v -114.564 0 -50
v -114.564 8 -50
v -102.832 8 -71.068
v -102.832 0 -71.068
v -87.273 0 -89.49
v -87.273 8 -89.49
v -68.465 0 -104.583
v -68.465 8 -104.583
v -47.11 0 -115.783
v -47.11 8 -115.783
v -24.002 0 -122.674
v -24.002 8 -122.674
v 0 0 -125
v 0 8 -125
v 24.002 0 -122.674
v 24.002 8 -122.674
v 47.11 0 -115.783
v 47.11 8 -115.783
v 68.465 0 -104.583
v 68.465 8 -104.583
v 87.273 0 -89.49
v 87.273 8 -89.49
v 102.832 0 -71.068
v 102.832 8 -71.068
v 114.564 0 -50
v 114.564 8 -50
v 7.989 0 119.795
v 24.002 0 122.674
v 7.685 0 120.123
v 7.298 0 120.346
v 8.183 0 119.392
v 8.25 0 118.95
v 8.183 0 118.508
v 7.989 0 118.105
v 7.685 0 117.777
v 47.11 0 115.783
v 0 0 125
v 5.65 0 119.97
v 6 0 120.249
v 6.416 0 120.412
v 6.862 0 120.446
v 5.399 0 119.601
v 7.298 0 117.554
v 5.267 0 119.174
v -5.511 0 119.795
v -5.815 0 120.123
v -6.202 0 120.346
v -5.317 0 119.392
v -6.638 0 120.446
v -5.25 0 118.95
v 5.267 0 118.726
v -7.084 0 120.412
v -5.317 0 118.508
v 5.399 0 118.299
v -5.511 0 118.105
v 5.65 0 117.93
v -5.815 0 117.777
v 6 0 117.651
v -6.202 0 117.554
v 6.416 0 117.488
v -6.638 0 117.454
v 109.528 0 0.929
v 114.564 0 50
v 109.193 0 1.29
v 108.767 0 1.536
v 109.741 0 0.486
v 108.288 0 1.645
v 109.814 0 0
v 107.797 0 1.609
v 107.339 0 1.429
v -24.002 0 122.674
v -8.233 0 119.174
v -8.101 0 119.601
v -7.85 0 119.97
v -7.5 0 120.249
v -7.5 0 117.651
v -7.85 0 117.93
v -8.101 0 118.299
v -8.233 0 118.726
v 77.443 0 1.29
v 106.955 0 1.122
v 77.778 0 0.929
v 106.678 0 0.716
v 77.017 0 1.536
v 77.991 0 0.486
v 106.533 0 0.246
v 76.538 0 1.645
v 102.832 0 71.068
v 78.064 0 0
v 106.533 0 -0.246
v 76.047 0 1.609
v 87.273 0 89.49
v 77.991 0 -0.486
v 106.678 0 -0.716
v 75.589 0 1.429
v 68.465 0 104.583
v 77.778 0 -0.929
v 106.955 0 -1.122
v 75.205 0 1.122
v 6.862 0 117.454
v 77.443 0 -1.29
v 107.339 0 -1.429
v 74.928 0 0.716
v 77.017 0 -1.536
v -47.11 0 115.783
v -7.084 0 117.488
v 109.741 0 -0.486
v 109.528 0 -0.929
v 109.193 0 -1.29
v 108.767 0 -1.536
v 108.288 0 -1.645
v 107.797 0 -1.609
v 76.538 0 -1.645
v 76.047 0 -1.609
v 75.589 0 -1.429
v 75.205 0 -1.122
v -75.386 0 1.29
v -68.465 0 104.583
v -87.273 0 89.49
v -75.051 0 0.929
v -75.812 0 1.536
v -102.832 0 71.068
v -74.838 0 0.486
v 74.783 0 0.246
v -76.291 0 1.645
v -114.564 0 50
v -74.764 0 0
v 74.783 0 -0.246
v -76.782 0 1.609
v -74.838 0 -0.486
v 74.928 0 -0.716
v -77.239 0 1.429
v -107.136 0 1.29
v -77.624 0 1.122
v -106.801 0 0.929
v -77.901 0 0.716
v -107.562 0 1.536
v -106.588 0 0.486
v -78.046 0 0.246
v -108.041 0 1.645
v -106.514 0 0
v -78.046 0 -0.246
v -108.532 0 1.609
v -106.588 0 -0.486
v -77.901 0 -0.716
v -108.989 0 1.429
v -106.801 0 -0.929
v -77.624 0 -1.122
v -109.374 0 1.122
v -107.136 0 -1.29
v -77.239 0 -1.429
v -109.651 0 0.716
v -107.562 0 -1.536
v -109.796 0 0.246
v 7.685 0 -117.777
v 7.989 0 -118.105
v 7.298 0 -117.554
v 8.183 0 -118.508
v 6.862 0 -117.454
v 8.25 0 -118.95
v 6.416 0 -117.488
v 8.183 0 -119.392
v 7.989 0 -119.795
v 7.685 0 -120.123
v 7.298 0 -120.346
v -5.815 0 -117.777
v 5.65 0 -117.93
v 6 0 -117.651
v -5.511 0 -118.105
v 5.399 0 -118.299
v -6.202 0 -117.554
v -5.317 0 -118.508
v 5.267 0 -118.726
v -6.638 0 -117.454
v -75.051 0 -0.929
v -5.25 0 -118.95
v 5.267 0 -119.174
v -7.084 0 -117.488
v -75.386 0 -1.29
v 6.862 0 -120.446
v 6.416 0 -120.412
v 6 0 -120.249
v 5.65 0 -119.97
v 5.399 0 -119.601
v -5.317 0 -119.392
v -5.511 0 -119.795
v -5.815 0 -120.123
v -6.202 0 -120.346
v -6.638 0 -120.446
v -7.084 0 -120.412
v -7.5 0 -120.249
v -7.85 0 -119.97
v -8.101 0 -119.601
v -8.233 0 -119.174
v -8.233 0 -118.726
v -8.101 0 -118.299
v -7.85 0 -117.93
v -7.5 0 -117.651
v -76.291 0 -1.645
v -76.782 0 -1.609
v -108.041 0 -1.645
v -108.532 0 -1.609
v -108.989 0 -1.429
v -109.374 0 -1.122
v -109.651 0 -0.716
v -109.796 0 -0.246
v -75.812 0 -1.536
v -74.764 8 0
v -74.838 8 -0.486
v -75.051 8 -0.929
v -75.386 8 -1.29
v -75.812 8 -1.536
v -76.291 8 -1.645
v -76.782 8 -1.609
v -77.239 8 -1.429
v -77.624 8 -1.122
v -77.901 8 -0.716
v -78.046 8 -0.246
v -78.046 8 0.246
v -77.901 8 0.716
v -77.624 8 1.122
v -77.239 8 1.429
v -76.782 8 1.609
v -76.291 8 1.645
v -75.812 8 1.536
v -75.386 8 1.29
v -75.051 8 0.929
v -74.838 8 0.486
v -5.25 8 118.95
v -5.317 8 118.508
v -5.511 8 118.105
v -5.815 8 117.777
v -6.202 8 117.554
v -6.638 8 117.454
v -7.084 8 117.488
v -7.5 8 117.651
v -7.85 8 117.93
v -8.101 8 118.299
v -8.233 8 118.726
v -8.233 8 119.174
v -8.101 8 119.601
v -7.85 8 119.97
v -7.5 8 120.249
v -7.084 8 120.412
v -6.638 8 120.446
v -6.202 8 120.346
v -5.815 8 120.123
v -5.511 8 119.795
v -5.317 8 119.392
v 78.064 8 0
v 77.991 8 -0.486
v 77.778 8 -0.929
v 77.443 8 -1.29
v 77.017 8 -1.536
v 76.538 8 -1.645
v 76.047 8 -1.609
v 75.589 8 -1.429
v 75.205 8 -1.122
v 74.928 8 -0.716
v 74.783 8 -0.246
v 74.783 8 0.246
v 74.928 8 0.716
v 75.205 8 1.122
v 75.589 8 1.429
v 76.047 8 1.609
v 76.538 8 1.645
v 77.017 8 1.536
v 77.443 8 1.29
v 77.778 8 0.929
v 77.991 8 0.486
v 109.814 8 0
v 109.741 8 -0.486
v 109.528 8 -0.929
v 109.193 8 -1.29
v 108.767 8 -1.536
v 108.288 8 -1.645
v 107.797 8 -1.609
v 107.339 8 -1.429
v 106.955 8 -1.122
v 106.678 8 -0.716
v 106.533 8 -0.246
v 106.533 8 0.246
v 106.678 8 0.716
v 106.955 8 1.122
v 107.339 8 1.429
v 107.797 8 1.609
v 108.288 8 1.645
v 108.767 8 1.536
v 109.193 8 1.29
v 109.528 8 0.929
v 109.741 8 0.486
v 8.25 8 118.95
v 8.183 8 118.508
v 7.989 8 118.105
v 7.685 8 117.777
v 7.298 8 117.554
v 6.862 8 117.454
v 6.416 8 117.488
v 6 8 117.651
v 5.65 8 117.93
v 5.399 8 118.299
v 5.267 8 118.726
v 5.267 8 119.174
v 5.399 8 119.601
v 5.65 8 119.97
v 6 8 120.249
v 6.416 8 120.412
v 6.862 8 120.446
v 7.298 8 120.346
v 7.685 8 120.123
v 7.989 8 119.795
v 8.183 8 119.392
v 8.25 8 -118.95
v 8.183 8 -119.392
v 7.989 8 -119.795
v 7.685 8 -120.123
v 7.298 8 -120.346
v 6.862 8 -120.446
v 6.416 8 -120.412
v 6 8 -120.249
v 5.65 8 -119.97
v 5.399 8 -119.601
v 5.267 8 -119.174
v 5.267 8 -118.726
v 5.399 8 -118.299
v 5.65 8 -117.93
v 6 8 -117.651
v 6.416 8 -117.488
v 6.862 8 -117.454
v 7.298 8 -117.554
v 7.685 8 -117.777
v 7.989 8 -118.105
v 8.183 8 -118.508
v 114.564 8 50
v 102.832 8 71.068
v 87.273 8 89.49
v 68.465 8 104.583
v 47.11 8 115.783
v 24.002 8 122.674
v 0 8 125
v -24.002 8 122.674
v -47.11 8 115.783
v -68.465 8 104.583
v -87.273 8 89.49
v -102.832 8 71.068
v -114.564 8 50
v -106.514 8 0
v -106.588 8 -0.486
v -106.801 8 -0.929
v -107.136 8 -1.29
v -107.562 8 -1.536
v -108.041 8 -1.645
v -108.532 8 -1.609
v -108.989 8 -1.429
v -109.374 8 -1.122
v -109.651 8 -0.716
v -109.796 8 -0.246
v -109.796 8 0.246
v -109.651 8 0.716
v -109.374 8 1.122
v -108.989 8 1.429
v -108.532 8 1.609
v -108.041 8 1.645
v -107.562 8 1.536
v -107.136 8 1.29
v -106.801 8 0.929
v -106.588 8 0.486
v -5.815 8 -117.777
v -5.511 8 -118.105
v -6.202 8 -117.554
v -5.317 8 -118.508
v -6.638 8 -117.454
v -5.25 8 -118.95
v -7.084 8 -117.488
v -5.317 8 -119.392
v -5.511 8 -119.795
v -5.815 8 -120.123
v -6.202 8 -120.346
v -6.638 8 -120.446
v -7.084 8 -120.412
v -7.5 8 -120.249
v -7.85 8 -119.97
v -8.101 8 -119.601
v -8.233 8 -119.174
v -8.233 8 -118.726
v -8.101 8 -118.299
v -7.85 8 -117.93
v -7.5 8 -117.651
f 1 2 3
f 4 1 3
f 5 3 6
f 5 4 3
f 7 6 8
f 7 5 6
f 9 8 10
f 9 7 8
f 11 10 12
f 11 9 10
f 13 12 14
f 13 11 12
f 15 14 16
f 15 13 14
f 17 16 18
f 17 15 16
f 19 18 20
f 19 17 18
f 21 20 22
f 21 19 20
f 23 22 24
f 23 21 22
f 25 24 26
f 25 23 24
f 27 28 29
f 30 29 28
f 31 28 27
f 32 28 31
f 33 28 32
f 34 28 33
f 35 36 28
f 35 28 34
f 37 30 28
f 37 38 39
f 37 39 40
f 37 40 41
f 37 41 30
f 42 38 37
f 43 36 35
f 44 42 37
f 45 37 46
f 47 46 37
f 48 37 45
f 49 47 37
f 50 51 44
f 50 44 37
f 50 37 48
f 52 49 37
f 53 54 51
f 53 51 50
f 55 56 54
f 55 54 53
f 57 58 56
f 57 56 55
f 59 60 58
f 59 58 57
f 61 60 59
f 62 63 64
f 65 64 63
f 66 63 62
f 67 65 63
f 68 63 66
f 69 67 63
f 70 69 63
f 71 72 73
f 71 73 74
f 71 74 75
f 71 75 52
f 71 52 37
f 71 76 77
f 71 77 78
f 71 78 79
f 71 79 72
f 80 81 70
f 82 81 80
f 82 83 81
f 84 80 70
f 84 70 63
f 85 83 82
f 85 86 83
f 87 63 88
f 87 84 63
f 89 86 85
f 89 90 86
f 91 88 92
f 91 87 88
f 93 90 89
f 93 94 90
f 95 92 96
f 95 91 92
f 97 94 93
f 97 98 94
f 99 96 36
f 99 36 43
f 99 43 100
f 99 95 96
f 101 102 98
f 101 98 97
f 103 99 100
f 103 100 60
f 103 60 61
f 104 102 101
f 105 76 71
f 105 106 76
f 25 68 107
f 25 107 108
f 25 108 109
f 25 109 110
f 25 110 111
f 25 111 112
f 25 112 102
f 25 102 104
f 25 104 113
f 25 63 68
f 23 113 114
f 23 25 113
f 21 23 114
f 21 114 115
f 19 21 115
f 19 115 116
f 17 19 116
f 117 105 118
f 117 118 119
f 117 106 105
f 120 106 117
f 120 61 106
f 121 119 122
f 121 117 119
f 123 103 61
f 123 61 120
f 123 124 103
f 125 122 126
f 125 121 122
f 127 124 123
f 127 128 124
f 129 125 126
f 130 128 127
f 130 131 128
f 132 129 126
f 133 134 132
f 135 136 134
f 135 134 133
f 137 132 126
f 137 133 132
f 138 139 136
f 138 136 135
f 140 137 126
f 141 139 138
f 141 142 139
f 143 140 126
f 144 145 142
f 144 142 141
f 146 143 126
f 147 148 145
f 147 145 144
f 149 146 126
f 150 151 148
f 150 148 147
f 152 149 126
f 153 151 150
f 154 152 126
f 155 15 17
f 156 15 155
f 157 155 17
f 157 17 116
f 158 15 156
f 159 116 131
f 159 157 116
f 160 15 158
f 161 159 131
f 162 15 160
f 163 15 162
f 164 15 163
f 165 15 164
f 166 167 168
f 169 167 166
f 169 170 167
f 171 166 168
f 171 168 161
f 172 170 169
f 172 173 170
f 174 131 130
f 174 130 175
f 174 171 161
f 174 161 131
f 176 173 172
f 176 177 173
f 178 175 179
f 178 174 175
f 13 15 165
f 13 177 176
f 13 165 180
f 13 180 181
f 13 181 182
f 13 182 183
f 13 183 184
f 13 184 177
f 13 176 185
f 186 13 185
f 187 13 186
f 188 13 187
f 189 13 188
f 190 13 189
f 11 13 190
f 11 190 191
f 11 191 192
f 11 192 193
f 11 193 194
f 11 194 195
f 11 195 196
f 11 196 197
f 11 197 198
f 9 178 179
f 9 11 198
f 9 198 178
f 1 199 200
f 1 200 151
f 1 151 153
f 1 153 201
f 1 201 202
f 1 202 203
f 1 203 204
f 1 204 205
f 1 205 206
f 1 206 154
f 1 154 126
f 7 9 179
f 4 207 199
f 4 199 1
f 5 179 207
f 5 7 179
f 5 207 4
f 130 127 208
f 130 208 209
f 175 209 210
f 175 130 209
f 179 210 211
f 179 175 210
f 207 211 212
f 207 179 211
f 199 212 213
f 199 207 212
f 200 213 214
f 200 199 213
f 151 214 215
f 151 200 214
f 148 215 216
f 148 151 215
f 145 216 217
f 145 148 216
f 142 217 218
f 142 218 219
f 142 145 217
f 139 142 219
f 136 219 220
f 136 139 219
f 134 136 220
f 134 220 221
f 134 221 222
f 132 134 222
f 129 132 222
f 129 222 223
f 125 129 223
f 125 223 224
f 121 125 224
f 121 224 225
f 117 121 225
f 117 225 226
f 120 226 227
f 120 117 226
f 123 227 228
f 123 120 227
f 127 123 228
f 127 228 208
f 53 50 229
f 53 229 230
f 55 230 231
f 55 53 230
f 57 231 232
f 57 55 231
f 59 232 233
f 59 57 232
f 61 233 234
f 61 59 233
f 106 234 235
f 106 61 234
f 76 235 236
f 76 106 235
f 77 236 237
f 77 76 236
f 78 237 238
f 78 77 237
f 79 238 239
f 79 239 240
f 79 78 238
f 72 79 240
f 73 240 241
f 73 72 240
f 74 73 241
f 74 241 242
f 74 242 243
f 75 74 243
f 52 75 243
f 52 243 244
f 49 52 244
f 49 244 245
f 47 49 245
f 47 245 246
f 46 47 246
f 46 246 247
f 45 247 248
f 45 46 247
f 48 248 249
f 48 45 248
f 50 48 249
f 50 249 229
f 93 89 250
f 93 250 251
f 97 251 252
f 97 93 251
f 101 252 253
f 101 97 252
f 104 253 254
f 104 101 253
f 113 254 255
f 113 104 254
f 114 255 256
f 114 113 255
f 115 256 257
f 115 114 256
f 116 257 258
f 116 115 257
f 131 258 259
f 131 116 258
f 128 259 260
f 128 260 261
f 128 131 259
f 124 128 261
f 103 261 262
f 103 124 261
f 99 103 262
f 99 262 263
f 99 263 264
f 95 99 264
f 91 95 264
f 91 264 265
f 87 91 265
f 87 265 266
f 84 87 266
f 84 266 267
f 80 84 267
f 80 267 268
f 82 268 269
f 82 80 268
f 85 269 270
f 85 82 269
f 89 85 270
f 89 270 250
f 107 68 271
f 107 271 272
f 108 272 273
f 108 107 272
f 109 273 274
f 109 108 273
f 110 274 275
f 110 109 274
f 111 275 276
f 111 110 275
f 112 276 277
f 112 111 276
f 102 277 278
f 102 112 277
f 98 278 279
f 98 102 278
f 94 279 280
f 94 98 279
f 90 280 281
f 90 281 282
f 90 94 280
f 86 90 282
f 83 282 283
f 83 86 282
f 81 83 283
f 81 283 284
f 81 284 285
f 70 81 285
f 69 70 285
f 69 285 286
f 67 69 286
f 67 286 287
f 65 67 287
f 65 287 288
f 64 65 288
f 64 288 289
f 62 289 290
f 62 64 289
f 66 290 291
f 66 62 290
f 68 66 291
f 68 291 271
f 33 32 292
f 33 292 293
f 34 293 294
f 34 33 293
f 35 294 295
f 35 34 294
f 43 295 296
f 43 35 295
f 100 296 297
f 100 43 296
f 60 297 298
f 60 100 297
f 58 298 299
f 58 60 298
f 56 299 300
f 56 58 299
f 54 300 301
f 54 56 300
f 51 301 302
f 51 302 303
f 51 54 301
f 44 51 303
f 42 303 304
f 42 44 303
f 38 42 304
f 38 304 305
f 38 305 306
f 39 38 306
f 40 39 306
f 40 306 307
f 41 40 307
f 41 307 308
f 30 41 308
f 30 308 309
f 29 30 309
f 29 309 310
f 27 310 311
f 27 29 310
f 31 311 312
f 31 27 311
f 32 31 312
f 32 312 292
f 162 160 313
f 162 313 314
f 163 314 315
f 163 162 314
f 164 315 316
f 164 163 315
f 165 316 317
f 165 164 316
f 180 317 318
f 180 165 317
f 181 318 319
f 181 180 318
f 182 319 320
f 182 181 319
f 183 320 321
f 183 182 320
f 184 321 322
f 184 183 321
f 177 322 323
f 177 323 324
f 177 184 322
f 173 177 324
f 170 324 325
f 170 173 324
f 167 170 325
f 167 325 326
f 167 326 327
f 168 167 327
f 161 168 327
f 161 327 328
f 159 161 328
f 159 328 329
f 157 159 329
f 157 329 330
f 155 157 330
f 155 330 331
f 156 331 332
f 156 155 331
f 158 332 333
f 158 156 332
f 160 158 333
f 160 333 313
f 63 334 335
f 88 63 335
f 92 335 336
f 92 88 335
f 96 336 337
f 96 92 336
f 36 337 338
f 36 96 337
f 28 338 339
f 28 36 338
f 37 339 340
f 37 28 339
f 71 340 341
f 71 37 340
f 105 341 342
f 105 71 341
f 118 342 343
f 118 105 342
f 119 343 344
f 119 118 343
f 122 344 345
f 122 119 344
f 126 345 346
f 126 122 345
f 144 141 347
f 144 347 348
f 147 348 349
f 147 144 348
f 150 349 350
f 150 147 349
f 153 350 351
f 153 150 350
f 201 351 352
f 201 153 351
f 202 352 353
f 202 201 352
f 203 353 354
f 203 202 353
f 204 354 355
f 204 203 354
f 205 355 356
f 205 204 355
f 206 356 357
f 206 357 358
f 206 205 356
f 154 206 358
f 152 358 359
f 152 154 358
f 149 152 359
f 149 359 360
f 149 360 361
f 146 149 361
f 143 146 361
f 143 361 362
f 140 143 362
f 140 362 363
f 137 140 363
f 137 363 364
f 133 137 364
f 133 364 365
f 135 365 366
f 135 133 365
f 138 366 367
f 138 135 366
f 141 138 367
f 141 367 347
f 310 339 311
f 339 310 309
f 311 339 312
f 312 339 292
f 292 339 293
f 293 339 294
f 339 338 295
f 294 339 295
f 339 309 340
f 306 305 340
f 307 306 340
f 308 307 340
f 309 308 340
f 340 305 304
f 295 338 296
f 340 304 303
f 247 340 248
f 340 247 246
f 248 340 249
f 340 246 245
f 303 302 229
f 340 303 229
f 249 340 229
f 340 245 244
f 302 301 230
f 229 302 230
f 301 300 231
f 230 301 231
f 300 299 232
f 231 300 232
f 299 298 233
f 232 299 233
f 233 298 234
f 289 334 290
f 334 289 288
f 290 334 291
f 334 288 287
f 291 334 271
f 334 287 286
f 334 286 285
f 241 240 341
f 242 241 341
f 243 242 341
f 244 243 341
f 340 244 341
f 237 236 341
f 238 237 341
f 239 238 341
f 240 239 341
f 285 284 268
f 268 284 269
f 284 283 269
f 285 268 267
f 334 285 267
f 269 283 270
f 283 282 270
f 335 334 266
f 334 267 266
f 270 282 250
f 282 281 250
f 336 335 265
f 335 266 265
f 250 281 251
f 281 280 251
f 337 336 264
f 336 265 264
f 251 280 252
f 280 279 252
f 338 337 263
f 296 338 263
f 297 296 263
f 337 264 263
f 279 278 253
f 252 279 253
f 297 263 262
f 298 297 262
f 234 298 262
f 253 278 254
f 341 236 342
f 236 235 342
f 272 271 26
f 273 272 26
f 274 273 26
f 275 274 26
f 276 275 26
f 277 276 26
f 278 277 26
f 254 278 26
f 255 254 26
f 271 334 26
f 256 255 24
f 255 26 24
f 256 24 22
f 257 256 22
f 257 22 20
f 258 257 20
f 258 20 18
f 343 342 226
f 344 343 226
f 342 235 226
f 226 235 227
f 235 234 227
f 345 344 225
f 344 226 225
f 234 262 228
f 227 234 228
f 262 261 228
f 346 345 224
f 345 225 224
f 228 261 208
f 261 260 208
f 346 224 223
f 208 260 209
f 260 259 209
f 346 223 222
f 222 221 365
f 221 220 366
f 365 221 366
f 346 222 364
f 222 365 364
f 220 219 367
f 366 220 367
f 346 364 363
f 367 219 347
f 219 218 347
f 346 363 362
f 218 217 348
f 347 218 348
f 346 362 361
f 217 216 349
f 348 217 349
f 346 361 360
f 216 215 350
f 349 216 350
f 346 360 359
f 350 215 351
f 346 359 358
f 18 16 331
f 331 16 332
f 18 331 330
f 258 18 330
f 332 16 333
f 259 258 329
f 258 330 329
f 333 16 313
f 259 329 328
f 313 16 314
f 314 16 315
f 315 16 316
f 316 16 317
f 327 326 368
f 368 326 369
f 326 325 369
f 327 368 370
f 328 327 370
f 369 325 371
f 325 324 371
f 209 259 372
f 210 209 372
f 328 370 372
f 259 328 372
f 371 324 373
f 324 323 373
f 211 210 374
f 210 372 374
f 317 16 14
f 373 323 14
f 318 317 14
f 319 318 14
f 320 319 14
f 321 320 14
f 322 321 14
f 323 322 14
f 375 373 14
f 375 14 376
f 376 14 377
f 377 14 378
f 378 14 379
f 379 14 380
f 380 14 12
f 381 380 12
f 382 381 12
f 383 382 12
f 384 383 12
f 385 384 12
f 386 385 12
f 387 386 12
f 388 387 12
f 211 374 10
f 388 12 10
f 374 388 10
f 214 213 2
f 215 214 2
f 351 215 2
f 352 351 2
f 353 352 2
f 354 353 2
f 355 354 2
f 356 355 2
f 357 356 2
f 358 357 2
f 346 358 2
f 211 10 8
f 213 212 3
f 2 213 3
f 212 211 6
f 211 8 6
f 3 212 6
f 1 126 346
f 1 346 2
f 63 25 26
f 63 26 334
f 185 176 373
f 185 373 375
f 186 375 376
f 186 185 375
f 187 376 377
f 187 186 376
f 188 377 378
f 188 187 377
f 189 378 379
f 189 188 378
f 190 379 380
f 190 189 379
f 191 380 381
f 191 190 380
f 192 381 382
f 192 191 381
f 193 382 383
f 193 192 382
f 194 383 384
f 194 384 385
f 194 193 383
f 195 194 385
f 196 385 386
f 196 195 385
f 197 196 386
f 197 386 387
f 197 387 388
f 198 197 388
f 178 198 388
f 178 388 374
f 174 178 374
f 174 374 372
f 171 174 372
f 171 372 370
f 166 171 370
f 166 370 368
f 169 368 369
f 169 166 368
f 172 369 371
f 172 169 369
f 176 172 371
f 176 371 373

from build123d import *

# Parameters (mm, degrees)
CROQUIS1_R              = 1.65
CROQUIS1_R_2            = 1.5
SALIENTE_EXTRUIR1_DEPTH = 8


with BuildPart() as part:
    # Croquis1 → Saliente-Extruir1 (new body)
    with BuildSketch(Plane(origin=(0, 0, 0), x_dir=(1, 0, 0), z_dir=(0, 1, 0))):
        with BuildLine():
            Line((-114.564392374, -50), (-114.564392374, 50))
            ThreePointArc((-114.564392374, 50), (0, 125), (114.564392374, 50))
            Line((114.564392374, 50), (114.564392374, -50))
            ThreePointArc((114.564392374, -50), (0, -125), (-114.564392374, -50))
        make_face()
        with Locations((108.164392374, 0)):
            Circle(CROQUIS1_R, mode=Mode.SUBTRACT)
        with Locations((76.414392374, 0)):
            Circle(CROQUIS1_R, mode=Mode.SUBTRACT)
        with Locations((-108.164392374, 0)):
            Circle(CROQUIS1_R, mode=Mode.SUBTRACT)
        with Locations((-76.414392374, 0)):
            Circle(CROQUIS1_R, mode=Mode.SUBTRACT)
        with Locations((-6.75, 118.95)):
            Circle(CROQUIS1_R_2, mode=Mode.SUBTRACT)
        with Locations((6.75, 118.95)):
            Circle(CROQUIS1_R_2, mode=Mode.SUBTRACT)
        with Locations((6.75, -118.95)):
            Circle(CROQUIS1_R_2, mode=Mode.SUBTRACT)
        with Locations((-6.75, -118.95)):
            Circle(CROQUIS1_R_2, mode=Mode.SUBTRACT)
    extrude(amount=SALIENTE_EXTRUIR1_DEPTH)


solid = part.part
